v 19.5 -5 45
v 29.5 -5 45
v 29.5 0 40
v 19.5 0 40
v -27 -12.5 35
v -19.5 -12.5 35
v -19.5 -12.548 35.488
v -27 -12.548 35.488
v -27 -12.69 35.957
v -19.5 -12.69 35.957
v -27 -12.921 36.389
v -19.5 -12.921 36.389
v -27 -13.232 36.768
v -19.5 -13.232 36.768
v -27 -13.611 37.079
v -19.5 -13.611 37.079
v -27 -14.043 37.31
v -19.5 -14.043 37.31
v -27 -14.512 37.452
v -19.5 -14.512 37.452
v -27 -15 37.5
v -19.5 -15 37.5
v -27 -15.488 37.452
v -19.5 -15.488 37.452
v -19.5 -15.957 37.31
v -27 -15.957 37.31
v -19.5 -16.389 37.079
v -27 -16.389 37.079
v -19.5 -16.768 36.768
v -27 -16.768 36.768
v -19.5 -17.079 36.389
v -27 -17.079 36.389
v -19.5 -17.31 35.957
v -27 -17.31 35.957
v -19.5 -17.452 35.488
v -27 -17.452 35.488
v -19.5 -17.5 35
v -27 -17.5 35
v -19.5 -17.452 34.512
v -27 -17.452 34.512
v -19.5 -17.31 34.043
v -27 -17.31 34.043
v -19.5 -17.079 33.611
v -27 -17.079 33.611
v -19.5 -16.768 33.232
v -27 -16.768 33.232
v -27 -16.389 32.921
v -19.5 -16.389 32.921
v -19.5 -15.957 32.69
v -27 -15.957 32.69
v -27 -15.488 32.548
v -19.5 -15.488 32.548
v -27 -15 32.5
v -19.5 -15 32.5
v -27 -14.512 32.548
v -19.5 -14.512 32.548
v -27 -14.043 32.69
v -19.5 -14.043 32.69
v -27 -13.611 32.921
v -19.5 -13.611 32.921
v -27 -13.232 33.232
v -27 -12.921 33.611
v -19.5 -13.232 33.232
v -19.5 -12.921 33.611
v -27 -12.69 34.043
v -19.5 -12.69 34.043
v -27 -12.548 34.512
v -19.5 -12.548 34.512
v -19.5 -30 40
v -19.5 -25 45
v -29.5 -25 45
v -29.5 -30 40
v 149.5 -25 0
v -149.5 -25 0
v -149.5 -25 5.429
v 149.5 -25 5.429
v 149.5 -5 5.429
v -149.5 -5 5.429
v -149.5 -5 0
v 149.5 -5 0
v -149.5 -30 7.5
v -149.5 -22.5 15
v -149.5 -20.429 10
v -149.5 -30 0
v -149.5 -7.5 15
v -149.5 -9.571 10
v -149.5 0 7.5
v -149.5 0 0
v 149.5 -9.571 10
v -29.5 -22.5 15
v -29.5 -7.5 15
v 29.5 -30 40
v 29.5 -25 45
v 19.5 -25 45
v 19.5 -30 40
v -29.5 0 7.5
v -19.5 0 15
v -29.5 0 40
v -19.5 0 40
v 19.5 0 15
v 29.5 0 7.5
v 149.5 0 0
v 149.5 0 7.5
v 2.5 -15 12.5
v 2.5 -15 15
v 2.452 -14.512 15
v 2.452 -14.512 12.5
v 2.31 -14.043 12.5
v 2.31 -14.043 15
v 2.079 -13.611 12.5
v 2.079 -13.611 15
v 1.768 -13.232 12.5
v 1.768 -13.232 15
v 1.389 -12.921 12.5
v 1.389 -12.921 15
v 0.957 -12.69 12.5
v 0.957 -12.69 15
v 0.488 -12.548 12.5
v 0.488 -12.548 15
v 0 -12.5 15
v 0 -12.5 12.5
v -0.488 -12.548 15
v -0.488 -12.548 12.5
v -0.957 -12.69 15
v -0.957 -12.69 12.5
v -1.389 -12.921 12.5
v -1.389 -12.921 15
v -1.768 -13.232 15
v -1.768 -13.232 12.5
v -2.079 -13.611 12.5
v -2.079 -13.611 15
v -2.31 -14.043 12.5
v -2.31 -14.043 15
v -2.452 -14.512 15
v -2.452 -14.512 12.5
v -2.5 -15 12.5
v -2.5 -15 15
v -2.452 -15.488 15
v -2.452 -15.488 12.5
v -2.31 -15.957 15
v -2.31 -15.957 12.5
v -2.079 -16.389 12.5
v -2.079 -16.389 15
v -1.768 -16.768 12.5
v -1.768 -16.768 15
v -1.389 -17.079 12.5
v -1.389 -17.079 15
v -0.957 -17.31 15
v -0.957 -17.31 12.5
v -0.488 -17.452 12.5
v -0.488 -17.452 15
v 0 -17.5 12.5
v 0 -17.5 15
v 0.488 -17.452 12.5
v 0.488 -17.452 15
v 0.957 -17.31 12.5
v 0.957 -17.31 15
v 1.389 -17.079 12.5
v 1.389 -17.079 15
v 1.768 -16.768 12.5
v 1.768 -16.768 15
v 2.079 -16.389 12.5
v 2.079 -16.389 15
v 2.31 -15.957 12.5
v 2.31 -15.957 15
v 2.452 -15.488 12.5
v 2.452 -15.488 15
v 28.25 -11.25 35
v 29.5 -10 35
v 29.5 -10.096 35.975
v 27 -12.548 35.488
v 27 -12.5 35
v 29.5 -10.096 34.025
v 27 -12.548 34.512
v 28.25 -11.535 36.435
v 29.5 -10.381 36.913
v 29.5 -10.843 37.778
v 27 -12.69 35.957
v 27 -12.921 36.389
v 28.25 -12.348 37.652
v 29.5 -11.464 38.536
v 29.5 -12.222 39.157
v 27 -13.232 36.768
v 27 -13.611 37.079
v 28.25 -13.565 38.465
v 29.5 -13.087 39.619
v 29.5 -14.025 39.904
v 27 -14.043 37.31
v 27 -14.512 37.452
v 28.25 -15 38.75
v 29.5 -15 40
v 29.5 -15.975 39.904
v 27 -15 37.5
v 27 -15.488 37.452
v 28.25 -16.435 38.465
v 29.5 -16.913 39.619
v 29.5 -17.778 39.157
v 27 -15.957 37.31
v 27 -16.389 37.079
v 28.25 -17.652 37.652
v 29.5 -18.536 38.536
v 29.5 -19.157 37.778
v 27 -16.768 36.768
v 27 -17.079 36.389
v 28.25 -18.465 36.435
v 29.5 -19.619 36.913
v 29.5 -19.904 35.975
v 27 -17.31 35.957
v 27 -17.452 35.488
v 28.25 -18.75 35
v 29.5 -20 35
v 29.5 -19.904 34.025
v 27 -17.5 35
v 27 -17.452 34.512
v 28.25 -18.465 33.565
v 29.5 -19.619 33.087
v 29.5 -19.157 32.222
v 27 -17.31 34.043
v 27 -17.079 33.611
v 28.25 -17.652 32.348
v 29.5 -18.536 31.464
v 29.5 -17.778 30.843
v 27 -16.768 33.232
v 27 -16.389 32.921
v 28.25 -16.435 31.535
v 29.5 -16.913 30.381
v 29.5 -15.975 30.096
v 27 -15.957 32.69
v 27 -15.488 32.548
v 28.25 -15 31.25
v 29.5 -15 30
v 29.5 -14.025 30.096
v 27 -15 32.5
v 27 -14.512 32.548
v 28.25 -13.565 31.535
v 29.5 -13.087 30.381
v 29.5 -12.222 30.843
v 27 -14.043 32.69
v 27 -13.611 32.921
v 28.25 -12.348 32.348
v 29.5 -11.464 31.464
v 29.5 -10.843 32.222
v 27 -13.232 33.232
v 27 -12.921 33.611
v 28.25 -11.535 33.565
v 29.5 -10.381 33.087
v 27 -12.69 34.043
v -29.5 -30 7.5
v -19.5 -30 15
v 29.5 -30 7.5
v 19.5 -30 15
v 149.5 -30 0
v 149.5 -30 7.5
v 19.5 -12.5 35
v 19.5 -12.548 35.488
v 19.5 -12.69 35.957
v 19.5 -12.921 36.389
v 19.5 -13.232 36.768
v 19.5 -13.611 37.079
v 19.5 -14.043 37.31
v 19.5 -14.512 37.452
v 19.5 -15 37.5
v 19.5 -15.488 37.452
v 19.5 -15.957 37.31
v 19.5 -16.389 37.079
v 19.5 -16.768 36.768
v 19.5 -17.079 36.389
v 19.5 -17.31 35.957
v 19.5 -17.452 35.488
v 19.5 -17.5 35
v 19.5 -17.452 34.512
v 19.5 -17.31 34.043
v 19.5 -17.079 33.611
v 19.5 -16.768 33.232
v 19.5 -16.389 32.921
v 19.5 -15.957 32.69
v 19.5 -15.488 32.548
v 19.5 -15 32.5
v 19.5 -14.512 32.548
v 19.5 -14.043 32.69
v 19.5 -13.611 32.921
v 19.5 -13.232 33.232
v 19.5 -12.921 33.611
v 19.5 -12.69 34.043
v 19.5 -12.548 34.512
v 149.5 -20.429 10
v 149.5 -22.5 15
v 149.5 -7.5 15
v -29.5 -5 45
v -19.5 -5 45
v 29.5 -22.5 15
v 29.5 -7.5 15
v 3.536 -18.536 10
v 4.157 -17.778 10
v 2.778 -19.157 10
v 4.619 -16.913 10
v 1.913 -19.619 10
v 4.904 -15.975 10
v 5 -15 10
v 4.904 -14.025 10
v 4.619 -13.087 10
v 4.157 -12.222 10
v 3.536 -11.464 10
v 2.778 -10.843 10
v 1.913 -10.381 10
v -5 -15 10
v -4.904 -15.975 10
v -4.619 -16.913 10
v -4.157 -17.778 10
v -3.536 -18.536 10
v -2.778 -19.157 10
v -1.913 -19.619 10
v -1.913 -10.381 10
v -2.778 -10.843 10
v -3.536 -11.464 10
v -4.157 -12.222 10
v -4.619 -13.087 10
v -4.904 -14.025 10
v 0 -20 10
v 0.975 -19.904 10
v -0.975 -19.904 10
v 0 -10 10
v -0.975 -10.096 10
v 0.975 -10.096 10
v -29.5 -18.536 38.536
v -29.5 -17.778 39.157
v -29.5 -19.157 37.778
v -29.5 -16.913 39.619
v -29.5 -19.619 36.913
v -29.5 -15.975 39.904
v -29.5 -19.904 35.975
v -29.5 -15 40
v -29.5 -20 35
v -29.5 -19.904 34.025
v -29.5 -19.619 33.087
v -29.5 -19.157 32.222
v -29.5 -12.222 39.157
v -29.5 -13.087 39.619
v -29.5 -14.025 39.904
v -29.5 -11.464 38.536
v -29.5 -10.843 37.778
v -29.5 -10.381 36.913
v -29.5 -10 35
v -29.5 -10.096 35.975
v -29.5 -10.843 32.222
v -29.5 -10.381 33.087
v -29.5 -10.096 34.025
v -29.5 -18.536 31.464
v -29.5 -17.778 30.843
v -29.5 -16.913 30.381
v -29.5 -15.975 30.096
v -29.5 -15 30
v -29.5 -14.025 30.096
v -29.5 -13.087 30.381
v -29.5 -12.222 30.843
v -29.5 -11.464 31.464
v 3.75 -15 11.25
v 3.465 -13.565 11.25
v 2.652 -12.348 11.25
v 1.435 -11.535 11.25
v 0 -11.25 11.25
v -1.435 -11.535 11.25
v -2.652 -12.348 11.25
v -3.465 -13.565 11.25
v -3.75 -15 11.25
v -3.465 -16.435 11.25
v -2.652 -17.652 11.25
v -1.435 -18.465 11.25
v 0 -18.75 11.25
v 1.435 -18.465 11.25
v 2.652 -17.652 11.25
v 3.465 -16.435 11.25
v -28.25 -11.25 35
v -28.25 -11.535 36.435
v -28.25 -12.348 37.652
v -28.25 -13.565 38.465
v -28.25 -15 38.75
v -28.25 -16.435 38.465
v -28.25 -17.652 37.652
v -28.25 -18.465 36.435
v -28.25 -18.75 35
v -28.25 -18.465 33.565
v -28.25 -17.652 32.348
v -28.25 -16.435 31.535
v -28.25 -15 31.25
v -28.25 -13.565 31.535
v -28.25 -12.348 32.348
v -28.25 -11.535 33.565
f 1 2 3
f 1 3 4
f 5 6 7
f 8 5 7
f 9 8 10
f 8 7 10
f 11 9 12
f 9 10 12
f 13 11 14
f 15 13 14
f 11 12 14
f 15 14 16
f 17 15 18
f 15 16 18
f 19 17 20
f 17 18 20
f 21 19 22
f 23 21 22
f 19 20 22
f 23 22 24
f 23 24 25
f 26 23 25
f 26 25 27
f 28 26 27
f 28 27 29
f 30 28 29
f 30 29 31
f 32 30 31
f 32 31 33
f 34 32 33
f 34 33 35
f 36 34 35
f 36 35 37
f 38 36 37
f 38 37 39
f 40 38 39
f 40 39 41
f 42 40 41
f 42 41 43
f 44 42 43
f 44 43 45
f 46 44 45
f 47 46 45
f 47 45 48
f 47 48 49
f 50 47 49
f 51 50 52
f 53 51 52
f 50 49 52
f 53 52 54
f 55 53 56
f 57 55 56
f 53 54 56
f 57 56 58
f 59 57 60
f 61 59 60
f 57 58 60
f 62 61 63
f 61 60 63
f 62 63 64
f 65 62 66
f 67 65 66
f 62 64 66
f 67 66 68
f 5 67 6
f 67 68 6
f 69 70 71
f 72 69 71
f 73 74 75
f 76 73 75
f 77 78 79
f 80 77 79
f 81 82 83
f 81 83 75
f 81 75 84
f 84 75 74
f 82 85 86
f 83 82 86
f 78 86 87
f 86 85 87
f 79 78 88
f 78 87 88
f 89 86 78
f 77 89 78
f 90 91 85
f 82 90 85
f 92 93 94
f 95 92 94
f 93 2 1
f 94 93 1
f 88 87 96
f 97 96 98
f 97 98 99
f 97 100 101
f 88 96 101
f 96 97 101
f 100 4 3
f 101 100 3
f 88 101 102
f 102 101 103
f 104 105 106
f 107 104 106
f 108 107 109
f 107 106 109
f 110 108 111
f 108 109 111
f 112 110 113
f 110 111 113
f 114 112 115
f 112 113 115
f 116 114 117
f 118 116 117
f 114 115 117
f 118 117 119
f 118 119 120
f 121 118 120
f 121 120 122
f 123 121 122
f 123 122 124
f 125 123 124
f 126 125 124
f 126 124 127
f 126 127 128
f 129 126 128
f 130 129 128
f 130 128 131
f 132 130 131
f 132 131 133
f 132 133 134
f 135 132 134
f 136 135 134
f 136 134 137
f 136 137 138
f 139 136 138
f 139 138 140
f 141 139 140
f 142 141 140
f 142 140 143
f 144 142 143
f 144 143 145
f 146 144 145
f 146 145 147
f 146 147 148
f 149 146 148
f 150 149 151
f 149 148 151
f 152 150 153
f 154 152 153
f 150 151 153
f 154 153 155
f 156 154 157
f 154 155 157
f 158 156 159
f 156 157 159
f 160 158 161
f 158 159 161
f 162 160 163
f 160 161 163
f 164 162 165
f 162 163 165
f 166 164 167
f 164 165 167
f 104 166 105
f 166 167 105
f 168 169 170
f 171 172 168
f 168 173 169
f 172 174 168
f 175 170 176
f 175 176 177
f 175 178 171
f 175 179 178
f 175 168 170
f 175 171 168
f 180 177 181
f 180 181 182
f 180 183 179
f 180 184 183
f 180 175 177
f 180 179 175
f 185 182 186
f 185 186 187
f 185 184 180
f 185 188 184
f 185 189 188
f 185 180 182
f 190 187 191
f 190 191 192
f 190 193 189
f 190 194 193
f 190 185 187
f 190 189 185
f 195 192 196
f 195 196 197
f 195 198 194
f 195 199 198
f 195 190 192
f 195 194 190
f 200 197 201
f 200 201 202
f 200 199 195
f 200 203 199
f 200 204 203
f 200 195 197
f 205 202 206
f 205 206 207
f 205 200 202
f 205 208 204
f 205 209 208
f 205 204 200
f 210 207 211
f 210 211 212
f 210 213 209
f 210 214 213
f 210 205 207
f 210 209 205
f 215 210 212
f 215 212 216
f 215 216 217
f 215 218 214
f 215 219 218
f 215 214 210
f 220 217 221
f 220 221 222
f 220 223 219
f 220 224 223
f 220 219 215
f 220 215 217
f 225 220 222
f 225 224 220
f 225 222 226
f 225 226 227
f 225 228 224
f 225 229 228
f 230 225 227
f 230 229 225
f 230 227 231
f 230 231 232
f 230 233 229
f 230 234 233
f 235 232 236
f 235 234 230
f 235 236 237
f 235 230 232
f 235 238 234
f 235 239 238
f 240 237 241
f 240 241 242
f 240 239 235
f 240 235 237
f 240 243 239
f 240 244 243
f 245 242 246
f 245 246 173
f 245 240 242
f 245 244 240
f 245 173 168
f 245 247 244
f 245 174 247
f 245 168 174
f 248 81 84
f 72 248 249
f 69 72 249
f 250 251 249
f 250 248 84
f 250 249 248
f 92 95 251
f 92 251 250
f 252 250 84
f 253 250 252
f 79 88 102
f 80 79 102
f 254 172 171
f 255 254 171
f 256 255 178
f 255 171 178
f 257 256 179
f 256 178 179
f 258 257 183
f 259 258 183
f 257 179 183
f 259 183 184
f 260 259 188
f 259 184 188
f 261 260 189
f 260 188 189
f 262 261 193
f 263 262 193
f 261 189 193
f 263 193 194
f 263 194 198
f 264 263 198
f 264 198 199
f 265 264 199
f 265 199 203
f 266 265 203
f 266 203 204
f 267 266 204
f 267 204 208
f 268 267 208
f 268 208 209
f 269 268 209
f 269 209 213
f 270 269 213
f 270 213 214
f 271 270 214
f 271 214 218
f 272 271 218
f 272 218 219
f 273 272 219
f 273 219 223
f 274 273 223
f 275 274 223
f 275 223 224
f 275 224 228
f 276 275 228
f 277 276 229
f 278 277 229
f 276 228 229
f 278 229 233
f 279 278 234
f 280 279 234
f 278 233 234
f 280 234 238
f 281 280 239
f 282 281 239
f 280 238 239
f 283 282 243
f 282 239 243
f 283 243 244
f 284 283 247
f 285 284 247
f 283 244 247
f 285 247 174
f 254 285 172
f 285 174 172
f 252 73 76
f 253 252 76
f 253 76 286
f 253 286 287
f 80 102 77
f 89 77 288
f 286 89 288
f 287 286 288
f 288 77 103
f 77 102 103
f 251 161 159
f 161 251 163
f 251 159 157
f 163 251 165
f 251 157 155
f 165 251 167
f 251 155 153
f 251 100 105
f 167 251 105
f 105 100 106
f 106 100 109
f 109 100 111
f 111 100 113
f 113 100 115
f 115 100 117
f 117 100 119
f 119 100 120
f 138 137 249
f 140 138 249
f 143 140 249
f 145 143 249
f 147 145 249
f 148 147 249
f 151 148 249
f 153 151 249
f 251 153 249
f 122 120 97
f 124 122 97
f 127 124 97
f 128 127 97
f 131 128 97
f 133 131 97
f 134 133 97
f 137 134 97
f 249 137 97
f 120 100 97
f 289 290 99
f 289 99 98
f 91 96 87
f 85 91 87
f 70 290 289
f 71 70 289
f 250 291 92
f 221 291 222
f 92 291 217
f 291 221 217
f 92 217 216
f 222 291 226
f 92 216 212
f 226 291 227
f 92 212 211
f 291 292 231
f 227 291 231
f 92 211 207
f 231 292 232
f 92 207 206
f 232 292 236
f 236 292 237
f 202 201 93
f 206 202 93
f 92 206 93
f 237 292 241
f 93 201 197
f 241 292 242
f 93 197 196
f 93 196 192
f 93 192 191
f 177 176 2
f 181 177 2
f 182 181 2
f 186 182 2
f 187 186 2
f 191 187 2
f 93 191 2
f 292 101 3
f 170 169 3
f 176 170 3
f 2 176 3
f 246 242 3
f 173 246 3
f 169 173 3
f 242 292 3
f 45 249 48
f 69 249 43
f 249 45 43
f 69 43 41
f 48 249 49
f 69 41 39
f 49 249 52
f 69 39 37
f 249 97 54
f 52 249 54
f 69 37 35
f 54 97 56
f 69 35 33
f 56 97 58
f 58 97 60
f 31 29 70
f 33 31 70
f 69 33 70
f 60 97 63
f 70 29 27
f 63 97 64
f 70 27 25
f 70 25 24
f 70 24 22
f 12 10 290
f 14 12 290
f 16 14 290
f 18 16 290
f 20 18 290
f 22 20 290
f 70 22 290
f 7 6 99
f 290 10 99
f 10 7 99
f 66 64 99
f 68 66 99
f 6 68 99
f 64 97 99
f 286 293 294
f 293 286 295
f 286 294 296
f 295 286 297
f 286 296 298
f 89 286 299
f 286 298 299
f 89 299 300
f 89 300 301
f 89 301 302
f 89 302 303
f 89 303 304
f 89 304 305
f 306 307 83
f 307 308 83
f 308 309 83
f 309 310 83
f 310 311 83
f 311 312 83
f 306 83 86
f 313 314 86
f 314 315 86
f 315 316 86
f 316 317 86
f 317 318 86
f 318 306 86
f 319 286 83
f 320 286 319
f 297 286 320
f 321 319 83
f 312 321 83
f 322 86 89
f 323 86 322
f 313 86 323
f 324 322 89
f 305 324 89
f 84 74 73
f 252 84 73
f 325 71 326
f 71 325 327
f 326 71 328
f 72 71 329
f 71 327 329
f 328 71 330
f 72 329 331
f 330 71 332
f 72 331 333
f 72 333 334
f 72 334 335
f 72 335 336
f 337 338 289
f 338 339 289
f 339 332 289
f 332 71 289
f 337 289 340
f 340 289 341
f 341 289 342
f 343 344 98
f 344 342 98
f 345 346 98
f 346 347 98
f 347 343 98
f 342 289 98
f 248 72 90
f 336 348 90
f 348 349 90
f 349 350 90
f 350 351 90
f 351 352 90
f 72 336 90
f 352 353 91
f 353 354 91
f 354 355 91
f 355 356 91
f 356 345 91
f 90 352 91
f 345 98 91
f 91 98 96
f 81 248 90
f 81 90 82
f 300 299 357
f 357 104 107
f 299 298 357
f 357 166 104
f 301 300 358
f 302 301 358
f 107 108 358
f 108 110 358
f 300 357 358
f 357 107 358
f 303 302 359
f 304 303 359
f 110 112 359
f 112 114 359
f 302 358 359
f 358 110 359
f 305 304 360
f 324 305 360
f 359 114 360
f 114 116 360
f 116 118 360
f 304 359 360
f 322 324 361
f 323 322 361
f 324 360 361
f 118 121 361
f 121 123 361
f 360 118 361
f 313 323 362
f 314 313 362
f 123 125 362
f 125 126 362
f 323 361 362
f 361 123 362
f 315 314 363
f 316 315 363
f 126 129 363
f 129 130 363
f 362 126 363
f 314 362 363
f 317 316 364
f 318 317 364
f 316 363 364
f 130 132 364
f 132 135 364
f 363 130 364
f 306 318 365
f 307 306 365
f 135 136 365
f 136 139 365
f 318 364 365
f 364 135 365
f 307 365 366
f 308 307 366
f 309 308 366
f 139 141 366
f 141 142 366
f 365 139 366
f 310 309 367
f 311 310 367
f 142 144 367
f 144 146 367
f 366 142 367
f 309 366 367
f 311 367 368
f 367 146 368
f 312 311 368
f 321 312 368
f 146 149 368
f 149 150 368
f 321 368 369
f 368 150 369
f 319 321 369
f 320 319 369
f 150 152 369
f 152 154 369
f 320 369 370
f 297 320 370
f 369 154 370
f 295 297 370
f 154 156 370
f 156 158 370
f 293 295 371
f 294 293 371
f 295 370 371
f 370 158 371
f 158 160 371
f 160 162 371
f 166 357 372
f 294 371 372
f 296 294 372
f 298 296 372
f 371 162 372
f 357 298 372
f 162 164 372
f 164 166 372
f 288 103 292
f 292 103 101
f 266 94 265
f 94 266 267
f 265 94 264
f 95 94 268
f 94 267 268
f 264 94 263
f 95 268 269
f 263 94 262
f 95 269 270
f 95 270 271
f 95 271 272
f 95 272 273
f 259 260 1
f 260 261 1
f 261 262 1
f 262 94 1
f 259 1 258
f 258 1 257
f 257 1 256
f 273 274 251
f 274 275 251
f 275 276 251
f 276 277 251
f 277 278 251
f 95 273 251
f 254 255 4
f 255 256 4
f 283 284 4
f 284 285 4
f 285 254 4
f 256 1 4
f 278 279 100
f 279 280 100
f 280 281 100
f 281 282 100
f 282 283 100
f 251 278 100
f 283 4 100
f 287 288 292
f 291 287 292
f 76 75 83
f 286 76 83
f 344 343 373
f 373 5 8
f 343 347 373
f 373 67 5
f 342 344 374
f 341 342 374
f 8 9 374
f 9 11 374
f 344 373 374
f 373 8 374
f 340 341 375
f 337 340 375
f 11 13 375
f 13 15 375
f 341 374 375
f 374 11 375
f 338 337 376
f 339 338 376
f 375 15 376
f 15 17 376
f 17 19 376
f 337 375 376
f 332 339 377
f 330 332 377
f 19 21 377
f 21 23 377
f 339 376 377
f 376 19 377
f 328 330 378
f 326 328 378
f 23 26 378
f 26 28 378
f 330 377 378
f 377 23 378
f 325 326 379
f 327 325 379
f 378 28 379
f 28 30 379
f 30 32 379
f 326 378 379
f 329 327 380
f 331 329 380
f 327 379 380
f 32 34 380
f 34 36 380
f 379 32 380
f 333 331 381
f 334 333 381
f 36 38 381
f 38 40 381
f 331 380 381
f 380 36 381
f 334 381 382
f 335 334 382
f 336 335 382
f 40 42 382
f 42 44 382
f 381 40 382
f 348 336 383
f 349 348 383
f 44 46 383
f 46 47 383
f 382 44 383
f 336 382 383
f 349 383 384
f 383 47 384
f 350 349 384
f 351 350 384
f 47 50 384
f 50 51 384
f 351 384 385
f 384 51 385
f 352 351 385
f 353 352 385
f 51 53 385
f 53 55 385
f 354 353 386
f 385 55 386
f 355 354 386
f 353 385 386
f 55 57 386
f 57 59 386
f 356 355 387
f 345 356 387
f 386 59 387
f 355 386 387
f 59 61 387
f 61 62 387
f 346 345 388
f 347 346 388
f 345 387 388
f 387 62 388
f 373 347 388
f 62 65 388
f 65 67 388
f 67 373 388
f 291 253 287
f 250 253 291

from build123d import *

# Parameters (mm, degrees)
F1_DEPTH = 30
F2_SIZE  = 7.5
F4_DEPTH = 299.001
F5_SIZE  = 5
F6_R     = 2.5
F7_DEPTH = 179.001
F8_R     = 2.5
F9_DEPTH = 15.001
F10_SIZE = 2.5


with BuildPart() as f1:
    # F0 (on Front) → F1 (new body)
    with BuildSketch(Plane.XZ):
        Polygon((-149.5, 0), (0, 0), (149.5, 0), (149.5, 15), (29.5, 15), (29.5, 45), (19.5, 45), (19.5, 15), (0, 15), (-19.5, 15), (-19.5, 45), (-29.5, 45), (-29.5, 15), (-149.5, 15), align=None)
    extrude(amount=F1_DEPTH)

    # F2
    f2_edges = [f1.edges().sort_by_distance(p)[0] for p in [
        (-89.5, -30, 15),
        (-89.5, 0, 15),
        (89.5, 0, 15),
        (89.5, -30, 15),
    ]]
    chamfer(f2_edges, length=F2_SIZE)

    # F3 (on face) → F4 (cut, through all)
    with BuildSketch(Plane(origin=(-149.5, 0, 0), x_dir=(0, -1, 0), z_dir=(-1, 0, 0))):
        Polygon((5.000000033, 5.4289321745), (5.000000033, 0), (24.999999967, 0), (24.999999967, 5.4289321745), (20.4289321745, 9.999999967), (9.5710678255, 9.999999967), align=None)
    extrude(amount=-F4_DEPTH, mode=Mode.SUBTRACT)

    # F5
    f5_edges = [f1.edges().sort_by_distance(p)[0] for p in [
        (-24.5, 0, 45),
        (-24.5, -30, 45),
        (24.5, 0, 45),
        (24.5, -30, 45),
    ]]
    chamfer(f5_edges, length=F5_SIZE)

    # F6 (on face) → F7 (cut, through all)
    with BuildSketch(Plane.YZ.offset(29.5)):
        with Locations((-15, 35)):
            Circle(F6_R)
    extrude(amount=-F7_DEPTH, mode=Mode.SUBTRACT)

    # F8 (on face) → F9 (cut, through all)
    with BuildSketch(Plane.XY.offset(15)):
        with Locations((0, -15)):
            Circle(F8_R)
    extrude(amount=-F9_DEPTH, mode=Mode.SUBTRACT)

    # F10
    f10_edges = [f1.edges().sort_by_distance(p)[0] for p in [
        (-29.5, -17.5, 35),
        (29.5, -17.5, 35),
        (-2.5, -15, 10),
    ]]
    chamfer(f10_edges, length=F10_SIZE)


solid = f1.part
